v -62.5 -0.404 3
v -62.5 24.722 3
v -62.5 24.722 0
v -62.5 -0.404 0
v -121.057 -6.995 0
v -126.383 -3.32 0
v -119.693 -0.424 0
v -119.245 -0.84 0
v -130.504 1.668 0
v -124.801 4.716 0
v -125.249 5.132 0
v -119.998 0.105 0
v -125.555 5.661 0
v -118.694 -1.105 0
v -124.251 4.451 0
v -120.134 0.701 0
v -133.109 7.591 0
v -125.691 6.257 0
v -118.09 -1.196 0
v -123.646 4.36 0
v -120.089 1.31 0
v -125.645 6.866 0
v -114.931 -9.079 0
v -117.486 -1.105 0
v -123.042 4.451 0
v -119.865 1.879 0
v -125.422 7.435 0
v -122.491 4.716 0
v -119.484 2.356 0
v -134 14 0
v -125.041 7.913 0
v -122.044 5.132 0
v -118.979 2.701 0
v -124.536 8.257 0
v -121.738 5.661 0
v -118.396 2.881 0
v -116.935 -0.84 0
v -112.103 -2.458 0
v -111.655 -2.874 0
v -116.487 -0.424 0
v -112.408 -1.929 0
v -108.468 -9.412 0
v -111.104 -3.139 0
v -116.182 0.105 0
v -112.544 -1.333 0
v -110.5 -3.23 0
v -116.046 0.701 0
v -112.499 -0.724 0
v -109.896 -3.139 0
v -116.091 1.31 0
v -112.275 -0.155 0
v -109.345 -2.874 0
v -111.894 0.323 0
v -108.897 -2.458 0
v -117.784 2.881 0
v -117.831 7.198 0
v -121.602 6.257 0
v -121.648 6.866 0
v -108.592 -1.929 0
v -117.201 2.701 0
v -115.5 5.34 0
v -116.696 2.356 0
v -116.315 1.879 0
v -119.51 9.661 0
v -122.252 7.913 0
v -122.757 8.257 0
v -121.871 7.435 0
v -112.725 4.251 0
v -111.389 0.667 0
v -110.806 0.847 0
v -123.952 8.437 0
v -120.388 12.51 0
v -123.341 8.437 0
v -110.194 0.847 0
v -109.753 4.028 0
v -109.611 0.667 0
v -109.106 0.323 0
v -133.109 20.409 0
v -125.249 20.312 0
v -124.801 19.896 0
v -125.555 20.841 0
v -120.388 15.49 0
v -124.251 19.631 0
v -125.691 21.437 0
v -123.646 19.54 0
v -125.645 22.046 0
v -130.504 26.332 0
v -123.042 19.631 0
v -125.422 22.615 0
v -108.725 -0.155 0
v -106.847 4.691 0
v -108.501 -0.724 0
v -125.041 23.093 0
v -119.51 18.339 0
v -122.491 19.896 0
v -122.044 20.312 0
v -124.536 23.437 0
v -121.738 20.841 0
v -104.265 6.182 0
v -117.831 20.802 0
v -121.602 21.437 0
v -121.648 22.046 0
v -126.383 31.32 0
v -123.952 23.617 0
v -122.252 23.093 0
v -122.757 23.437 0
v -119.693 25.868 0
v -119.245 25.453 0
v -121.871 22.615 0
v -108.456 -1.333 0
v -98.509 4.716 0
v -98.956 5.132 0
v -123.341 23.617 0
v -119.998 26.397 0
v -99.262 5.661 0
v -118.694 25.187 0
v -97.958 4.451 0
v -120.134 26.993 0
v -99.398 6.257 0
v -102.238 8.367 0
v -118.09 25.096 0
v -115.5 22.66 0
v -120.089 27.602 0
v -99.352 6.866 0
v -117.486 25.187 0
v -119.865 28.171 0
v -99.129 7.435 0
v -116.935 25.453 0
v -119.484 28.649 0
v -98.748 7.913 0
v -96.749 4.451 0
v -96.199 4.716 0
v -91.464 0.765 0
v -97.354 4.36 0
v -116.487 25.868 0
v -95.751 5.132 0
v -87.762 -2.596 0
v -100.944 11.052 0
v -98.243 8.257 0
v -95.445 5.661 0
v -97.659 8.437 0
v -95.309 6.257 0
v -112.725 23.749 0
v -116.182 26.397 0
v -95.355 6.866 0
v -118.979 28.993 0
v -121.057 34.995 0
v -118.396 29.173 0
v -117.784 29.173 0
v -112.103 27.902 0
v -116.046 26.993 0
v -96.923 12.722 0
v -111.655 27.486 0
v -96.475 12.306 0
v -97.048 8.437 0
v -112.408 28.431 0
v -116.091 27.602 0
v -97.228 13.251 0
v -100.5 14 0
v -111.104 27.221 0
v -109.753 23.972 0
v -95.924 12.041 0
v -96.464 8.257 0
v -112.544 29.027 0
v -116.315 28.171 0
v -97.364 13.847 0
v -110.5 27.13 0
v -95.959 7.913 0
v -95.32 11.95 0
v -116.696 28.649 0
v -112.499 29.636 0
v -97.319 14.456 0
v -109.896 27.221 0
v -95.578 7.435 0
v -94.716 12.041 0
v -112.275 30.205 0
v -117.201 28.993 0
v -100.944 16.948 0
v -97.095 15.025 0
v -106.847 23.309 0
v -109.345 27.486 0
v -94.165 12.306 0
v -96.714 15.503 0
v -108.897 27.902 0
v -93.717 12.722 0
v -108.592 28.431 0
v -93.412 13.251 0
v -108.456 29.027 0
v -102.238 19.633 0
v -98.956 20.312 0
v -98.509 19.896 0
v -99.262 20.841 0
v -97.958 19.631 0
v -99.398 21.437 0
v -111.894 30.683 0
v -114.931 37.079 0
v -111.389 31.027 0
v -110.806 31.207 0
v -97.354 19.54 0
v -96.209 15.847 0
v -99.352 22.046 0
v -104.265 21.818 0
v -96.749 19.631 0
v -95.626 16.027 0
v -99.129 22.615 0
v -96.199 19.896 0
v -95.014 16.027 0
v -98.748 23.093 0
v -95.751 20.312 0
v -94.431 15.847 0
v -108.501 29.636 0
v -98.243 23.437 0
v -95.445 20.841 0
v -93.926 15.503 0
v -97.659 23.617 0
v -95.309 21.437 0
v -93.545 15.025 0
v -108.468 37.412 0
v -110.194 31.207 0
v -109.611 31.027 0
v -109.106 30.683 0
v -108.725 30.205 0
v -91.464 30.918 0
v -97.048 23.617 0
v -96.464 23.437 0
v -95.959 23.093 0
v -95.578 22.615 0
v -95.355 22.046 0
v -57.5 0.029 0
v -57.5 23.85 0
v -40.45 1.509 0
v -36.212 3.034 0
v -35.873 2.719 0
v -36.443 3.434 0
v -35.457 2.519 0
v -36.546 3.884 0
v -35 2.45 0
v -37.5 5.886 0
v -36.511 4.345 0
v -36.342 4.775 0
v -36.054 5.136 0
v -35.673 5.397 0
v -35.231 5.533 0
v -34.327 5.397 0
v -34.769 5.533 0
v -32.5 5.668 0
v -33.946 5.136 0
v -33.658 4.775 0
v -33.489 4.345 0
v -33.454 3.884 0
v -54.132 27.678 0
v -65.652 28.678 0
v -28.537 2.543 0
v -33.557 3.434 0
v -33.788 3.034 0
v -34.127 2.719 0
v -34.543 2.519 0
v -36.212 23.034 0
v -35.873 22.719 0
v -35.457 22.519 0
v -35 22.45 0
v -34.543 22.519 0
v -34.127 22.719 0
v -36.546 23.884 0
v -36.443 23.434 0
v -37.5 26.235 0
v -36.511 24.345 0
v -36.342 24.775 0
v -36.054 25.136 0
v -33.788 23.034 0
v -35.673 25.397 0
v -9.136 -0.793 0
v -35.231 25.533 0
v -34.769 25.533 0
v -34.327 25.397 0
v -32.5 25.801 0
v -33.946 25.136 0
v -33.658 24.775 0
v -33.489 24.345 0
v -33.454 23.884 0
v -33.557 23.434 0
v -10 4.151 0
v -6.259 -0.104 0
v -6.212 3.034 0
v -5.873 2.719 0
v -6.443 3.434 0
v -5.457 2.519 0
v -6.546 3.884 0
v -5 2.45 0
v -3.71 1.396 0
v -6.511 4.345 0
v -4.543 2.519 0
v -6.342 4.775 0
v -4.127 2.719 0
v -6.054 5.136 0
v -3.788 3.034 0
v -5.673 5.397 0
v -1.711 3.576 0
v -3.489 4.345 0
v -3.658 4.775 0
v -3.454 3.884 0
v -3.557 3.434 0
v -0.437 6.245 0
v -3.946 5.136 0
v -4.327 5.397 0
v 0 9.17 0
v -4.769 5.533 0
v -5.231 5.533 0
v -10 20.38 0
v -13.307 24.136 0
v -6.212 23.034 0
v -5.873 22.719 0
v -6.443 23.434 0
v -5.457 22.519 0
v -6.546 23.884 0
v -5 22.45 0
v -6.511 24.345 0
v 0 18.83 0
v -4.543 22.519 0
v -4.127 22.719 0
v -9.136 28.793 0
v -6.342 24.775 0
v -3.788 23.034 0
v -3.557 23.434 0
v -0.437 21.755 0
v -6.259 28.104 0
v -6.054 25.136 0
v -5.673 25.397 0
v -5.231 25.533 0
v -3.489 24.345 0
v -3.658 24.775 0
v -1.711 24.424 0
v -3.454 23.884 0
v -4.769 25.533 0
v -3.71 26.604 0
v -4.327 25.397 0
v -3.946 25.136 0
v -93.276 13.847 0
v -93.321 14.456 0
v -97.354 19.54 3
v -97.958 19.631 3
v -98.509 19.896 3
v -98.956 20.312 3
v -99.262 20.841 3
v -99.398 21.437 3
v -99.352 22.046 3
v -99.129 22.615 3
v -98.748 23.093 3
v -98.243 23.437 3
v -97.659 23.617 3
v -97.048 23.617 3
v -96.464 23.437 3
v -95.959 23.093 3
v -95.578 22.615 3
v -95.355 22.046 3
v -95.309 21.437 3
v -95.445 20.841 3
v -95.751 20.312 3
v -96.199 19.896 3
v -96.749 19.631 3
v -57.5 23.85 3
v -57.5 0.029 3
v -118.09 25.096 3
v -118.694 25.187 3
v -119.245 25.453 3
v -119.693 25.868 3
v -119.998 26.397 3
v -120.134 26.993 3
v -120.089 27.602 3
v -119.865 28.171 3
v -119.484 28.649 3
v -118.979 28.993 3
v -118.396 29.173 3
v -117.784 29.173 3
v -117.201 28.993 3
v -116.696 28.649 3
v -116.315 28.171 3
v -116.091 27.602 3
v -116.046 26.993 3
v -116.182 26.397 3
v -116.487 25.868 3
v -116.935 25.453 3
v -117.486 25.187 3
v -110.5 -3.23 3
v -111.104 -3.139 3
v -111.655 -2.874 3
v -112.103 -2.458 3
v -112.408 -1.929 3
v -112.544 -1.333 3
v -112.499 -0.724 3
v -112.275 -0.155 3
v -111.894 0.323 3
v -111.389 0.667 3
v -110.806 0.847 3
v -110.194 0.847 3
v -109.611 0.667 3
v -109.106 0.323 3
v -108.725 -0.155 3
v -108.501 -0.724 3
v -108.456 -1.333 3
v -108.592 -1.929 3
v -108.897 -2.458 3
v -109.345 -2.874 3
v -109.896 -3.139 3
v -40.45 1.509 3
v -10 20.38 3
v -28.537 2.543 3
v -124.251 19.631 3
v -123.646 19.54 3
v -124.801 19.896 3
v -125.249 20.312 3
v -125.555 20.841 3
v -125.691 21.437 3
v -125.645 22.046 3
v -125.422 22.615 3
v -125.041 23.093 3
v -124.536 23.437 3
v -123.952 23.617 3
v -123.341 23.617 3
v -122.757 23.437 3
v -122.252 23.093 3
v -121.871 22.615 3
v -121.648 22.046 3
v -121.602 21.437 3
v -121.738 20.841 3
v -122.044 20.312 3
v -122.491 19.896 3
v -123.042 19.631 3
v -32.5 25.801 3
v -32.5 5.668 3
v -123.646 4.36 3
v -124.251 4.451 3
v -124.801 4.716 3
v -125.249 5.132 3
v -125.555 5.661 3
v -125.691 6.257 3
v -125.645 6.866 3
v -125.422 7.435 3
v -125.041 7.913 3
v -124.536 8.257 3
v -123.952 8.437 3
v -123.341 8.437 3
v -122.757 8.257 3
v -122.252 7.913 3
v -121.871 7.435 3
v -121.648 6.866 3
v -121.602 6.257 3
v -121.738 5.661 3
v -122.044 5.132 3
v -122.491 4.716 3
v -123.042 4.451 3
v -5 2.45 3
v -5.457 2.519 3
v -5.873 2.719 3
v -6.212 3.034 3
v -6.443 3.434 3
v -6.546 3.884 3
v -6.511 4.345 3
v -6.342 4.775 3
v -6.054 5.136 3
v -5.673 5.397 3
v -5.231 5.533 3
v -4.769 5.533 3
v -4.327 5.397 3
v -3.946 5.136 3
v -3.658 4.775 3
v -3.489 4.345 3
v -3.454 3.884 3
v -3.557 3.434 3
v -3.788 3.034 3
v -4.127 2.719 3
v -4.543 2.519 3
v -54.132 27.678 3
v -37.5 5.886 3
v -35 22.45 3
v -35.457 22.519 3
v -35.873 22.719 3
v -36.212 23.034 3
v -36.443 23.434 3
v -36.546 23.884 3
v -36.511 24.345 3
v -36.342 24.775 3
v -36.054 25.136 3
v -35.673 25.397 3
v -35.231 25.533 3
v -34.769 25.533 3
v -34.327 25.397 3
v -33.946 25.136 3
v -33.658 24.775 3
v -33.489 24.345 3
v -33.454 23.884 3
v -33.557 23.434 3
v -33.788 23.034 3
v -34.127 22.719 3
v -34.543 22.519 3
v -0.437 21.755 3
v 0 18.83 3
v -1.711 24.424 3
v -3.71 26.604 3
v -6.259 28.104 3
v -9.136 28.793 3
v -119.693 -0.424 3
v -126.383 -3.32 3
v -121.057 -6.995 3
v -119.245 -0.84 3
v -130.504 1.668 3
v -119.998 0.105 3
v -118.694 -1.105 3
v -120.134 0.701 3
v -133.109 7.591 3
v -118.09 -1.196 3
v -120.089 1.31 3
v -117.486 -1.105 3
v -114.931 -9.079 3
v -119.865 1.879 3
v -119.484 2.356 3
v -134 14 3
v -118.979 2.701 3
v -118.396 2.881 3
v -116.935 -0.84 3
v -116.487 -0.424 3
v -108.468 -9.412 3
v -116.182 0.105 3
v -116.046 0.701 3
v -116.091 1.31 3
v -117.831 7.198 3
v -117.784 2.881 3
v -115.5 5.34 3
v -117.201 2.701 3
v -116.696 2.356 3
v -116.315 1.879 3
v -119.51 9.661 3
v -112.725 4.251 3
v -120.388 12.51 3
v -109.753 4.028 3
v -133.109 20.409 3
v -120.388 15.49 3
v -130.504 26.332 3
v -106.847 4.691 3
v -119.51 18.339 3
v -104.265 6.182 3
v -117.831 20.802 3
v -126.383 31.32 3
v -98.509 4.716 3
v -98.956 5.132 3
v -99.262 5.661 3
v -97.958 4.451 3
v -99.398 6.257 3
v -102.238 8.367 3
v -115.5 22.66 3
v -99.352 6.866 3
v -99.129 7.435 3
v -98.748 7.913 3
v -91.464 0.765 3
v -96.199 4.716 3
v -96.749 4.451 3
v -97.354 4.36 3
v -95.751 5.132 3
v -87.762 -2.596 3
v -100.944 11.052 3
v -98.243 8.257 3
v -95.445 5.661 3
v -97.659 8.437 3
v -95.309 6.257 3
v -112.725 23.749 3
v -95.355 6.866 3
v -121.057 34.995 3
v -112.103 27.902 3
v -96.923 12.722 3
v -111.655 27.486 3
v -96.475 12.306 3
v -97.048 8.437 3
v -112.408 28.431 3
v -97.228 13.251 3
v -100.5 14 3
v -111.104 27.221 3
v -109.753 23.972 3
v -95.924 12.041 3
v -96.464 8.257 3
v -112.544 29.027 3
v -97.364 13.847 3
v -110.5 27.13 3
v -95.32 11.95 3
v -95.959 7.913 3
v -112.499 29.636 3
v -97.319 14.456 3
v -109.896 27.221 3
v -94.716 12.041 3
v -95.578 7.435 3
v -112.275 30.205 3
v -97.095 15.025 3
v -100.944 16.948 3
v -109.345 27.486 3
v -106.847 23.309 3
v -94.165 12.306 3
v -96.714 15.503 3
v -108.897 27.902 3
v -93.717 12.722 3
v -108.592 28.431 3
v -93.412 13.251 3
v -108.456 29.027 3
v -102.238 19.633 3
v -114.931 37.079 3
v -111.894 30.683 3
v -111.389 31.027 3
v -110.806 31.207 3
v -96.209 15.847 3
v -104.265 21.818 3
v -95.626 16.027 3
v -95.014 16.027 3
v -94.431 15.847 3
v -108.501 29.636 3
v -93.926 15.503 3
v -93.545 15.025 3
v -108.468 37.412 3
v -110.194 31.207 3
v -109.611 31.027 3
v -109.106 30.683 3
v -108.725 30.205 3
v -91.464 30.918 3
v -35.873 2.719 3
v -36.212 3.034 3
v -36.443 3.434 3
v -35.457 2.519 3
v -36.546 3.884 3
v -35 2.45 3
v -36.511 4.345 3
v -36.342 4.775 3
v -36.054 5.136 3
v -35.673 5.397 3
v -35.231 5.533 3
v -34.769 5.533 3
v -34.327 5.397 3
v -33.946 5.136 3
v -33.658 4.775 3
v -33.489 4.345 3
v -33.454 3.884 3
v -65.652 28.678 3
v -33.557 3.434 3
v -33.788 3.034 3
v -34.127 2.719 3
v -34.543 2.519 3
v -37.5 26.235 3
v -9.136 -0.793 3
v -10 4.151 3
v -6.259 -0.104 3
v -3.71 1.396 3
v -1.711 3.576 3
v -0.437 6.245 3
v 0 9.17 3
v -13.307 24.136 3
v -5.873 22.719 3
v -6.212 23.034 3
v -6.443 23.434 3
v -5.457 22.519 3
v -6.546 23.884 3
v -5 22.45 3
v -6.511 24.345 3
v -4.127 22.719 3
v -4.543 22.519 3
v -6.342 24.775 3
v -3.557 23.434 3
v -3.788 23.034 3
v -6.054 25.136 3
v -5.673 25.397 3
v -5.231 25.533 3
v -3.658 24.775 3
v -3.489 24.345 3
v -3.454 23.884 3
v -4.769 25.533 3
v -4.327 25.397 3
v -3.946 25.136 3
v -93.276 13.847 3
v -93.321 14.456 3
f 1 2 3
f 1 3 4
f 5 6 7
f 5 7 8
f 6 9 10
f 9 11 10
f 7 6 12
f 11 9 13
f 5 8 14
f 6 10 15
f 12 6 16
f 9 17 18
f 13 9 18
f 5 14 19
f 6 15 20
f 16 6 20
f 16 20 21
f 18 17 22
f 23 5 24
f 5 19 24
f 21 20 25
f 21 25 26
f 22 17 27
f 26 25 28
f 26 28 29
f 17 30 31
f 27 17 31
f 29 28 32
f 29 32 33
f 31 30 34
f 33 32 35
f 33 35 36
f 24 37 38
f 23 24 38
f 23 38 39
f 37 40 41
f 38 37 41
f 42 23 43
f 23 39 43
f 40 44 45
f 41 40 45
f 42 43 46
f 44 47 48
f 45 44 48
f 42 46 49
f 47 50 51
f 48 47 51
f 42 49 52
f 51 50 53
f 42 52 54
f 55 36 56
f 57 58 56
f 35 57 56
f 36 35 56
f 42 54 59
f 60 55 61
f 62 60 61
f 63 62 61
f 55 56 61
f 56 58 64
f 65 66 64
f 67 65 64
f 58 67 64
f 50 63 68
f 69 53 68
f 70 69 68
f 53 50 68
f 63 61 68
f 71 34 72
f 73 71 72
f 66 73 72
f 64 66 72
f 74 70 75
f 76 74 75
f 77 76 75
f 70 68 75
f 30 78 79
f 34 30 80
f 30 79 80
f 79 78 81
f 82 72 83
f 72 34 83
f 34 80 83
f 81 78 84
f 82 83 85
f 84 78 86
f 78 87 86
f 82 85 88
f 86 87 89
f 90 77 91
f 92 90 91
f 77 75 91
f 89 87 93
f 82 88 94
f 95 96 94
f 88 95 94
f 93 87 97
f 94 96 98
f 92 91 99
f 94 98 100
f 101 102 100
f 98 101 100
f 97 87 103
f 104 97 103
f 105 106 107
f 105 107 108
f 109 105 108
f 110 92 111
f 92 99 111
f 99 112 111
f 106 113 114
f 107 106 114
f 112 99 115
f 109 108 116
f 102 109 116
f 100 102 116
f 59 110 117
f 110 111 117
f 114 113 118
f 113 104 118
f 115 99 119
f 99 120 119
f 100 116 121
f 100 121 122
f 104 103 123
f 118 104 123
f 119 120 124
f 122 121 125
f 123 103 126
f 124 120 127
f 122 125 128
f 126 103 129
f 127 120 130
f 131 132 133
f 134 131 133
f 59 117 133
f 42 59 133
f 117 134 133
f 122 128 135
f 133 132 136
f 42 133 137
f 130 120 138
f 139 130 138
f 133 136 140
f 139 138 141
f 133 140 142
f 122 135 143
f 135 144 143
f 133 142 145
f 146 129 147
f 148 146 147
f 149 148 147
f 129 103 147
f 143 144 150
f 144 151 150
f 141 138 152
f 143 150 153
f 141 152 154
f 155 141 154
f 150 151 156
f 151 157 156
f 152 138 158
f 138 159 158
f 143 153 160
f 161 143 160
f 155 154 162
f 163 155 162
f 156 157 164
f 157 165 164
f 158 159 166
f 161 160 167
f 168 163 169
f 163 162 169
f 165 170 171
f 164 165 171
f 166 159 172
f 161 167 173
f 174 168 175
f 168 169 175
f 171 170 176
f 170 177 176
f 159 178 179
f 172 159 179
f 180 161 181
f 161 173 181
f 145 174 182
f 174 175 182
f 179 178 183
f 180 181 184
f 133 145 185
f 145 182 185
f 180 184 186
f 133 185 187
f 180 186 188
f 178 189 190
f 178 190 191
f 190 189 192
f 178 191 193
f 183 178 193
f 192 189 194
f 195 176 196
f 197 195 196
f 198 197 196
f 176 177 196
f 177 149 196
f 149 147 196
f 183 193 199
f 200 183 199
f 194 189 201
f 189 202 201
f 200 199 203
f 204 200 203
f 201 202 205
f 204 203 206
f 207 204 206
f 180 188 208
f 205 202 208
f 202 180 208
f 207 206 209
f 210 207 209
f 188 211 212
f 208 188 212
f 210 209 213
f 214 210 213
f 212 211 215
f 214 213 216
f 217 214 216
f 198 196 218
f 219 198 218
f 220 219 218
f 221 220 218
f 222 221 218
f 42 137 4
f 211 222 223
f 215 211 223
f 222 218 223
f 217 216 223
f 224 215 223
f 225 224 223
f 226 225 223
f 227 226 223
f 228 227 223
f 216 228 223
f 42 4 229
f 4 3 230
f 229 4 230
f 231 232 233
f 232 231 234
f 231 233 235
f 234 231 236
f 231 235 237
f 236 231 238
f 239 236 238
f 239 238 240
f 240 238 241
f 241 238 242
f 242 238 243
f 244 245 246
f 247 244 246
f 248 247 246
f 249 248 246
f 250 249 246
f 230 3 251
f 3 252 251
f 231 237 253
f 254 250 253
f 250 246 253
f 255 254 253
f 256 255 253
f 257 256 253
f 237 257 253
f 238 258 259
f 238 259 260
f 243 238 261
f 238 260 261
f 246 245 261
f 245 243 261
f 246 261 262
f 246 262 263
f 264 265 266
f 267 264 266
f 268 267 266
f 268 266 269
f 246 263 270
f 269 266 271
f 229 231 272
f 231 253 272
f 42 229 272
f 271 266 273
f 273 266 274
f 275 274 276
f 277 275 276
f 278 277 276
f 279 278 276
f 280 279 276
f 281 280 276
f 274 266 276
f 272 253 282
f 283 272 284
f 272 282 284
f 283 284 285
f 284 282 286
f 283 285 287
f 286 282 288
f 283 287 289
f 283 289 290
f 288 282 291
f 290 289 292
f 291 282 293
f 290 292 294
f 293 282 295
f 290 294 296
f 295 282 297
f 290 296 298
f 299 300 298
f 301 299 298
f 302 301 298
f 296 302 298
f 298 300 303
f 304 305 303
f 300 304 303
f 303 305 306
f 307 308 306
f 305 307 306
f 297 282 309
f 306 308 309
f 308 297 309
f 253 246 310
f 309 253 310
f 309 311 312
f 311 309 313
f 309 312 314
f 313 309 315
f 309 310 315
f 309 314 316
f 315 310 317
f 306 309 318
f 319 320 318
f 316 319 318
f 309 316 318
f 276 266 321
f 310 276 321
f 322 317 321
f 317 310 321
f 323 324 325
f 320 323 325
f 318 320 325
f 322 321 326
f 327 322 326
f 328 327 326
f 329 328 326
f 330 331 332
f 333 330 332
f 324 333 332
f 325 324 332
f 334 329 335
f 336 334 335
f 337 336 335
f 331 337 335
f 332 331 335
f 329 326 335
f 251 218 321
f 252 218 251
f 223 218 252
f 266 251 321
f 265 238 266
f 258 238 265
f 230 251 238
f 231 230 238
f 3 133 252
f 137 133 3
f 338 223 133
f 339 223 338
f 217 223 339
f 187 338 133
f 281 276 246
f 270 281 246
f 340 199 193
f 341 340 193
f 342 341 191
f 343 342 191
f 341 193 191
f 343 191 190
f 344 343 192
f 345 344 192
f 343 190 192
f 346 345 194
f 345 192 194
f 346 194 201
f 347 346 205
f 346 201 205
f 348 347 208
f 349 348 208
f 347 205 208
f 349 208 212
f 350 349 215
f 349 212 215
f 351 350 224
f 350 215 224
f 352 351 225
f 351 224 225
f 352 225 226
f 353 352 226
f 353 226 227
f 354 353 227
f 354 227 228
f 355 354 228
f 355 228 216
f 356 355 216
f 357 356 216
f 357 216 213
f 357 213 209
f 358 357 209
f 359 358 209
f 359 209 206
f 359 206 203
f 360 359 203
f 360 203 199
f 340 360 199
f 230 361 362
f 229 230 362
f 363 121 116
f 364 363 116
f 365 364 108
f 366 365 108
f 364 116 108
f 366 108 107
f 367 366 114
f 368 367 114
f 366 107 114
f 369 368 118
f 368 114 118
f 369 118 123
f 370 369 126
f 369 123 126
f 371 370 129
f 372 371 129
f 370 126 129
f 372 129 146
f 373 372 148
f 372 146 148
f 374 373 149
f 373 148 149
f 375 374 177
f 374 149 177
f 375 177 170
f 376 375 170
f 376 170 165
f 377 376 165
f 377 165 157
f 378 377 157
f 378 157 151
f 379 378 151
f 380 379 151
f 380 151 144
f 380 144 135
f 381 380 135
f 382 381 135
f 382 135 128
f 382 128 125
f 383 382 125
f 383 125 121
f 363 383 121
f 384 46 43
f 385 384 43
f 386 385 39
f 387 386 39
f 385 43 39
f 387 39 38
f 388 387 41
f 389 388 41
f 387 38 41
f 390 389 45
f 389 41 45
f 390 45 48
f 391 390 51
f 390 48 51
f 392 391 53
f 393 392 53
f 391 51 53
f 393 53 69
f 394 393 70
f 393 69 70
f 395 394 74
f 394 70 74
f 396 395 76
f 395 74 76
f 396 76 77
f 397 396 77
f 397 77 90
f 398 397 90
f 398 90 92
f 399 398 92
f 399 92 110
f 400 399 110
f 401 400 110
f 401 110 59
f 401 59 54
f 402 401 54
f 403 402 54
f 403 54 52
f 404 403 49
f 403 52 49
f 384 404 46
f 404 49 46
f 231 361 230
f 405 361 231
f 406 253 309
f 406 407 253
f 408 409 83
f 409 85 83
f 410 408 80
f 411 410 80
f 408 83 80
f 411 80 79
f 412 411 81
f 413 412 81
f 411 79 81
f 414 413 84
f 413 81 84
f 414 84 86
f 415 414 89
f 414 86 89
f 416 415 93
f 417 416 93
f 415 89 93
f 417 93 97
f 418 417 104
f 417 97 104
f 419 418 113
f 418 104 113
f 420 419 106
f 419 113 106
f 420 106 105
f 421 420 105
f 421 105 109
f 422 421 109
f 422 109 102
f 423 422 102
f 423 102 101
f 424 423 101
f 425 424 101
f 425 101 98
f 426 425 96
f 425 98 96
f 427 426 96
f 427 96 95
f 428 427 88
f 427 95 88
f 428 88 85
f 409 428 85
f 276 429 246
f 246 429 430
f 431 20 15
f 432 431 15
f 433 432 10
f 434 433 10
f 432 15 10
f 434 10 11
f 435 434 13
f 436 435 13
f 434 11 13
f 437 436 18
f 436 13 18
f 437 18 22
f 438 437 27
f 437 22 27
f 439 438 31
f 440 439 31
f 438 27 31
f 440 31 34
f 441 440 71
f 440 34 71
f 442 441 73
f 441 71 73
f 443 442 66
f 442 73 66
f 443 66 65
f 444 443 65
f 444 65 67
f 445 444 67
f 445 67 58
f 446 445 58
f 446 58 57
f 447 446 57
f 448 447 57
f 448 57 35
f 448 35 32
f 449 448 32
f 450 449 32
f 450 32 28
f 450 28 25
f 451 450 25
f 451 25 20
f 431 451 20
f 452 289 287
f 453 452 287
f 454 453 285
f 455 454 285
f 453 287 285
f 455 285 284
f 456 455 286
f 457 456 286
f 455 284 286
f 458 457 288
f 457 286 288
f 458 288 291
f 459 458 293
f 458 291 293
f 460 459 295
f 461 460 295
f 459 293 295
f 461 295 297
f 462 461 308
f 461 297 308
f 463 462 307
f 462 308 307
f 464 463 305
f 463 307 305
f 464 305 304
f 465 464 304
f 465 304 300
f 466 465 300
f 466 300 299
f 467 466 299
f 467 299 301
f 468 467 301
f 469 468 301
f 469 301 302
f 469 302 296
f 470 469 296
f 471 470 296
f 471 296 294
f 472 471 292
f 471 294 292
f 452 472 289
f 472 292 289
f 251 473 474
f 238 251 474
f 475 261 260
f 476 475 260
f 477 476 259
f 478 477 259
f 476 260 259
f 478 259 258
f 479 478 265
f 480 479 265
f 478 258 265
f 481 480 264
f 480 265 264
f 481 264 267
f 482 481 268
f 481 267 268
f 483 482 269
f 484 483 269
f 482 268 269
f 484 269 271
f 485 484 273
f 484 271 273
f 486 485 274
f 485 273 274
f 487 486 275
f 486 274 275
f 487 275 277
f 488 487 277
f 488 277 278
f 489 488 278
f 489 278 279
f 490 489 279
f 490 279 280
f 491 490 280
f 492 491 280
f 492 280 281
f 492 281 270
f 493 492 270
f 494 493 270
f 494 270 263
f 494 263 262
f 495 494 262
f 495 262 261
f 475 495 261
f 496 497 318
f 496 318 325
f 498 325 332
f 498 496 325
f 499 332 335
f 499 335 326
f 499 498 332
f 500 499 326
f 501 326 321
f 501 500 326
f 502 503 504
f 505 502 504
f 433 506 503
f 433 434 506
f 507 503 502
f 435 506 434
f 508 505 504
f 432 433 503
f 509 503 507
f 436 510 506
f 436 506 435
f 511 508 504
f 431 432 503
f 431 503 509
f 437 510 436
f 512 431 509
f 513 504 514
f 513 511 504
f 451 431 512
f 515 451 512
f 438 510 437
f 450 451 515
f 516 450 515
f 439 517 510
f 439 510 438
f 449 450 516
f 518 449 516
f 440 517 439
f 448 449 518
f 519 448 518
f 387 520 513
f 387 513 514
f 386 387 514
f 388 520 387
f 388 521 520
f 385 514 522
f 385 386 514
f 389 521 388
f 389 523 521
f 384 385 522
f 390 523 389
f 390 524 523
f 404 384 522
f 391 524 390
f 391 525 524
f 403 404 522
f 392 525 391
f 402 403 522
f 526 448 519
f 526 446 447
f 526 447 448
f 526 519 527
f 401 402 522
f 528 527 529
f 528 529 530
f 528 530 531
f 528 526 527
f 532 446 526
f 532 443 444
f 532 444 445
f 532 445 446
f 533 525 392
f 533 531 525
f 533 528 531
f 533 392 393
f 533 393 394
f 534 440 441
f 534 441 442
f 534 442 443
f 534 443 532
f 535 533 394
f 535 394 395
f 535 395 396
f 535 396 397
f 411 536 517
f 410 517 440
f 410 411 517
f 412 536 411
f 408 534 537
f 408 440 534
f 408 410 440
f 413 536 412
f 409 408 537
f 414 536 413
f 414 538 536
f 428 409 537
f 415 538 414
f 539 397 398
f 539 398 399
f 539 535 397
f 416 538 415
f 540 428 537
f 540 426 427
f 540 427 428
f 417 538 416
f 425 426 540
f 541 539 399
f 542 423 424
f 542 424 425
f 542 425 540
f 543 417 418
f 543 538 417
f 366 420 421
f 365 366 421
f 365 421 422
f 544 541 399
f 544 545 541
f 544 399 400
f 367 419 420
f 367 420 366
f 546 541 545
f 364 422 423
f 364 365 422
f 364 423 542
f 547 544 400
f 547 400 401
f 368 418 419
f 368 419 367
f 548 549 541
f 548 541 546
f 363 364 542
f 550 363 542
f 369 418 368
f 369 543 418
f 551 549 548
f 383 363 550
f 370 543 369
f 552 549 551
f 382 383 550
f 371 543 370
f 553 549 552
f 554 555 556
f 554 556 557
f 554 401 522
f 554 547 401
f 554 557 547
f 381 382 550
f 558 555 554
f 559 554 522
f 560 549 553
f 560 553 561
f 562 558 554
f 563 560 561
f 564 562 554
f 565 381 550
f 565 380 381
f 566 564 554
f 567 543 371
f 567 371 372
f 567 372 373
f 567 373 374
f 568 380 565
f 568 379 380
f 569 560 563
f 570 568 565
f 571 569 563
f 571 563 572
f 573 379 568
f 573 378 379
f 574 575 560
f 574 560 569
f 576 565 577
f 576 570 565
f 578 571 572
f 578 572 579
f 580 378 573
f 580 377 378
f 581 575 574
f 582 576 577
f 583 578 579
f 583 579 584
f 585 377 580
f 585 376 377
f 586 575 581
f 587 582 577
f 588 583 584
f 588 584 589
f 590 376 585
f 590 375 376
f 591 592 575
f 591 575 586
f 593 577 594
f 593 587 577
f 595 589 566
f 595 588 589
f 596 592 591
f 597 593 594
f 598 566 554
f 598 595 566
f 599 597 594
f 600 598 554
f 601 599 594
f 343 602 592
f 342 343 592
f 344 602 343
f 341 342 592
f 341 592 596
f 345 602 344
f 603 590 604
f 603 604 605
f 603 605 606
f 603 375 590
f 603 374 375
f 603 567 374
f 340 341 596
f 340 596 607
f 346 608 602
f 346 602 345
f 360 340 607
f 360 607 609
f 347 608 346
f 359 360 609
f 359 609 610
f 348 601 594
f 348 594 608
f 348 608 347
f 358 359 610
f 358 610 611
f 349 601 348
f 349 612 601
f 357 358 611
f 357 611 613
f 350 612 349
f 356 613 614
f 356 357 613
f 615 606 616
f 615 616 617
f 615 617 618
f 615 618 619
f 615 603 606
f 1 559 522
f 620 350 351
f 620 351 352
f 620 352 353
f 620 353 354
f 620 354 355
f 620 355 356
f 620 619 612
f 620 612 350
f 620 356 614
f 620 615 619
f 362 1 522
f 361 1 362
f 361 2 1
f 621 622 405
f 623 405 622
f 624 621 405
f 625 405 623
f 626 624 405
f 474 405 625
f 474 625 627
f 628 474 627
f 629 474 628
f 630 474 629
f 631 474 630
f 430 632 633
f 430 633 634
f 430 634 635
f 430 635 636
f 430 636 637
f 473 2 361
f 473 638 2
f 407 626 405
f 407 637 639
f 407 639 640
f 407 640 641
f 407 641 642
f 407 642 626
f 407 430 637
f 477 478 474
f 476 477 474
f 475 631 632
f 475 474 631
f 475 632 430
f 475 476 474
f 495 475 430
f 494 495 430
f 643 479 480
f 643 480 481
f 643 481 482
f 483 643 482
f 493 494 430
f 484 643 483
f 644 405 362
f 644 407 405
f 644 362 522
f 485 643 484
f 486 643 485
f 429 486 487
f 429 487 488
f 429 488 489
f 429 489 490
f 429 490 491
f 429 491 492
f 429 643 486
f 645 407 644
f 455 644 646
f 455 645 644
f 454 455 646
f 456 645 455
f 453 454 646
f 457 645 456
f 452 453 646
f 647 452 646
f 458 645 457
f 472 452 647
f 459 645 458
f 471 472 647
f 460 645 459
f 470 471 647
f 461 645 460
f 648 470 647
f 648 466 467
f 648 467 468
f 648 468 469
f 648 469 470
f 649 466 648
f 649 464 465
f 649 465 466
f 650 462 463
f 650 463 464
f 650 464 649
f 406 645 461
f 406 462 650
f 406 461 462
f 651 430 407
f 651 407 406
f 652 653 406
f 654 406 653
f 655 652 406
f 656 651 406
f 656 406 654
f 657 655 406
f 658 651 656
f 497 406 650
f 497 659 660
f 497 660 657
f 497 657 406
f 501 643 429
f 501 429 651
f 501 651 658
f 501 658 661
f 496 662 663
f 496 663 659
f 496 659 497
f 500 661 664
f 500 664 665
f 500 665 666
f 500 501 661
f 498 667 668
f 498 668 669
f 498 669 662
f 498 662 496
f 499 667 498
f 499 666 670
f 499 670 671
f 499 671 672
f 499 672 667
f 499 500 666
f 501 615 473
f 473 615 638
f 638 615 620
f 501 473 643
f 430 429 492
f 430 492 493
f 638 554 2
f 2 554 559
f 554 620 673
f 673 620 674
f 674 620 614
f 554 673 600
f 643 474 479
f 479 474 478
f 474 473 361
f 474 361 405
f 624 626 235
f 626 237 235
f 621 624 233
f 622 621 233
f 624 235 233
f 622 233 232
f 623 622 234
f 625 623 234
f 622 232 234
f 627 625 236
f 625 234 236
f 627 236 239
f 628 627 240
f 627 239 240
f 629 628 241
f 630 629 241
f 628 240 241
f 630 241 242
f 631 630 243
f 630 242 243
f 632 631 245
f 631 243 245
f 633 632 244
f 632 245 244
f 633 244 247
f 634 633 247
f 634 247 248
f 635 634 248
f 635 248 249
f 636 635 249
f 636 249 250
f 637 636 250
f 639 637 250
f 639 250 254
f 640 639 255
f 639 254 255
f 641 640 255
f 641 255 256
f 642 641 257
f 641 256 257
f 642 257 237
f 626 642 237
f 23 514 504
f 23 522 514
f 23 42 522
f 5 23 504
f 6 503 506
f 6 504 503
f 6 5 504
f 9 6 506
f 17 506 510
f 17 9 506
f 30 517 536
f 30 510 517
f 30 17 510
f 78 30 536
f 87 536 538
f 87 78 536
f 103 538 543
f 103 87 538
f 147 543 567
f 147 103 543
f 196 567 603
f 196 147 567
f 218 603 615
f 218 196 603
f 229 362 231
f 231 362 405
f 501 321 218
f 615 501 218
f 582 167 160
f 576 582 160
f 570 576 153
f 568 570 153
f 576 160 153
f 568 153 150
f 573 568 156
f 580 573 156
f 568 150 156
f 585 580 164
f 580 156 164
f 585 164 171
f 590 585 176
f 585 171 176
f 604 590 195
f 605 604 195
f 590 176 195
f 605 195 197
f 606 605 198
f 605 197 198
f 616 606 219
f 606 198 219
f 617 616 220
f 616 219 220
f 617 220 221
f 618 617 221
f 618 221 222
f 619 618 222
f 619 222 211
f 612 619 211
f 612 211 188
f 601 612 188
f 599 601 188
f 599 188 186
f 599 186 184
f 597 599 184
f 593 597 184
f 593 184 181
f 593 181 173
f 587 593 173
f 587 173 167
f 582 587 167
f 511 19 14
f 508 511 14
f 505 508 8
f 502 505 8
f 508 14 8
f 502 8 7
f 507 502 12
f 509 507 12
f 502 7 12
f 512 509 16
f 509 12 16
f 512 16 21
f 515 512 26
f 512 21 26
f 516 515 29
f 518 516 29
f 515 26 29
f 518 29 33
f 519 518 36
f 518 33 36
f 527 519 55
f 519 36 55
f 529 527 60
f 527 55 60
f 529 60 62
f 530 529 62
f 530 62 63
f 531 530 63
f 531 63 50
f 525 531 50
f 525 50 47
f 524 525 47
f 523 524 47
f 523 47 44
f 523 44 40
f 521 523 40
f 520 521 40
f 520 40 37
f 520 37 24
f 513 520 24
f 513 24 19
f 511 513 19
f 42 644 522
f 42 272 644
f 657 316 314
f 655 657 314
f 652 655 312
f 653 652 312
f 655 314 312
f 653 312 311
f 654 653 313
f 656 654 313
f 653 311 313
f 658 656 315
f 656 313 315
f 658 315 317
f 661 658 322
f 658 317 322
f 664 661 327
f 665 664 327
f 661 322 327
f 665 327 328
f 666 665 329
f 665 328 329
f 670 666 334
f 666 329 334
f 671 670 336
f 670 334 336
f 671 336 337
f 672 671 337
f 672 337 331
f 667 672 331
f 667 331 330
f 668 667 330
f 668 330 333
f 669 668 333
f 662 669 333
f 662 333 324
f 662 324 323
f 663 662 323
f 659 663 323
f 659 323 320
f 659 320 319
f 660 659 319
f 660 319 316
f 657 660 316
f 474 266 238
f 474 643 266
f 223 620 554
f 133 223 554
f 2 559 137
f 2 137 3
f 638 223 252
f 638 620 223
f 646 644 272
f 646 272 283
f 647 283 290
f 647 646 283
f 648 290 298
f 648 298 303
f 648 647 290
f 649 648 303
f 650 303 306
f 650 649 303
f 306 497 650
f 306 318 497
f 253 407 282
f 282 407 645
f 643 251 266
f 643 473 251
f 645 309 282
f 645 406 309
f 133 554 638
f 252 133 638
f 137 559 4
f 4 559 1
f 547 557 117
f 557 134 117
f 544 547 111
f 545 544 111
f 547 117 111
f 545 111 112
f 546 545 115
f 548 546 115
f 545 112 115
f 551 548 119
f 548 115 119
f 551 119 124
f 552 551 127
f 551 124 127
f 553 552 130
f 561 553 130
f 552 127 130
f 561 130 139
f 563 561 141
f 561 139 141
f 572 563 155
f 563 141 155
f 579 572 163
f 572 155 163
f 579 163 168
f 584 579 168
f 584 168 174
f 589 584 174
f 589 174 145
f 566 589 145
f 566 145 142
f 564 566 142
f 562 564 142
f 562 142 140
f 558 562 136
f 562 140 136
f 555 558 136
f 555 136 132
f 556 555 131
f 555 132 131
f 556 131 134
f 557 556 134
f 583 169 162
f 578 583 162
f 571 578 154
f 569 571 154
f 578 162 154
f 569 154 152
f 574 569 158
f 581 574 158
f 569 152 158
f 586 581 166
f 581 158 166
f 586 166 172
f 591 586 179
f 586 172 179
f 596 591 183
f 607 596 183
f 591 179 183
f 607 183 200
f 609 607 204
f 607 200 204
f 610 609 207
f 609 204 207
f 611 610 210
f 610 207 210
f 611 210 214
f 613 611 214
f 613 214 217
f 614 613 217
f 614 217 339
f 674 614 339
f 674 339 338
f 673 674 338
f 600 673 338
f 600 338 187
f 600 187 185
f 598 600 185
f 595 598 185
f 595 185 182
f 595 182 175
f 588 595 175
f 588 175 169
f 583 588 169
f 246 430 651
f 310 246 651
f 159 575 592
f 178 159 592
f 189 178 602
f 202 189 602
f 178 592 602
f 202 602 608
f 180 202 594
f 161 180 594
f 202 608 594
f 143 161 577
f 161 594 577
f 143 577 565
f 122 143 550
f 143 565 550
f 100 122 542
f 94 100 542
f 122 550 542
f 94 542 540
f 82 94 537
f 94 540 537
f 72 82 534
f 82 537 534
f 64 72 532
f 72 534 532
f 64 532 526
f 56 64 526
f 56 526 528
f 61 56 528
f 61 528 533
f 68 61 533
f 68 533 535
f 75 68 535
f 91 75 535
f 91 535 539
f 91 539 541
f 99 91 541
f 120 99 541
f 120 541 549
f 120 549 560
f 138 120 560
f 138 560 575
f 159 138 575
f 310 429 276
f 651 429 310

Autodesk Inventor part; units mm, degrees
ref_plane "YZ Plane" through (0, 0, 0) normal (1, 0, 0) x (0, 1, 0)
ref_plane "XZ Plane" through (0, 0, 0) normal (0, 1, 0) x (-1, 0, 0)
ref_plane "XY Plane" through (0, 0, 0) normal (0, 0, 1) x (1, 0, 0)
sketch "スケッチ1" plane through (0, 0, 0) normal (0, 0, 1) x (1, 0, 0)
  line L0 (0, 0) -> (-57.5, 0)
  line L1 (-57.5, 0) -> (-57.5, 28)
  line L2 (-57.5, 28) -> (0, 28)
  line L3 (0, 28) -> (0, 0)
  line L4 (0, 14) -> (-110.5, 14)
  circle A0 centre (-110.5, 14) radius 53
  circle A1 centre (-110.5, 14) radius 23.5
  line L5 (0, 28) -> (-108.4685, 37.412)
  line L6 (0, 0) -> (-108.4685, -9.412)
  point P0 (-108.4685, -9.412)
  dimension "d3" = 47
  dimension "d0" = 28
  dimension "d1" = 57.5
  dimension "d2" = 106
extrude "押し出し1" add sketch "スケッチ1" along normal blind 3 contours L6 A0 L1 L0 | L0 L1 L4 L3 | L4 L1 L2 L3 | L6 A1 L4 A0 | A0 L5 L2 L1 | L4 A1 L5 A0 | A1
sketch "スケッチ2" plane through (0, 0, 3) normal (0, 0, 1) x (1, 0, 0)
  line L0 (0, 28) -> (-108.4685, 37.412) projected
  line L1 (0, 28) -> (-47.5, 28)
  line L2 (-47.5, 28) -> (-47.5, 0)
  line L3 (-47.5, 0) -> (0, 0)
  line L4 (0, 0) -> (0, 28)
  line L5 (-5, 28) -> (-5, 0)
  line L6 (-35, 28) -> (-35, 0)
  line L7 (0, 14) -> (-47.5, 14)
  point P0 (-35, 24)
  point P1 (-5, 24)
  point P2 (-35, 4)
  point P3 (-5, 4)
  dimension "d6" = 28
  dimension "d7" = 47.5
  dimension "d8" = 5
  dimension "d9" = 30
  dimension "d10" = 10
  dimension "d11" = 10
hole "穴1" at (-35, 24, 3) at (-5, 24, 3) at (-35, 4, 3) at (-5, 4, 3) direction (0, 0, -1) diameter 3.1 end through all
sketch "スケッチ3" plane through (0, 0, 3) normal (0, 0, 1) x (1, 0, 0)
  arc A0 (-108.4685, 37.412) -> (-108.4685, -9.412) centre (-110.5, 14) ccw projected
  circle A1 centre (-110.5, 14) radius 15.18
  circle A2 centre (-110.5, 14) radius 6
  line L0 (-110.5, 14) -> (-118.09, 27.1463)
  line L1 (-123.6463, 21.59) -> (-110.5, 14)
  line L2 (-110.5, 14) -> (-102.91, 27.1463)
  line L3 (-110.5, 14) -> (-110.5, 29.18)
  point P0 (0, 0)
  point P1 (-123.6463, 6.41)
  point P2 (-110.5, -1.18)
  point P3 (-97.3537, 6.41)
  point P4 (-97.3537, 21.59)
  point P5 (-110.5, 29.18)
  point P6 (-118.09, 0.8537)
  point P7 (-95.32, 14)
  dimension "d19" = 30.36
  dimension "d22" = 360
  dimension "d24" = 12
  dimension "d28" = 360
  dimension "d59" = 30
  dimension "d61" = 30
hole "穴2" at (-123.6463, 21.59, 3) at (-123.6463, 6.41, 3) at (-110.5, -1.18, 3) at (-97.3537, 6.41, 3) at (-97.3537, 21.59, 3) at (-110.5, 29.18, 3) at (-118.09, 27.1463, 3) at (-118.09, 0.8537, 3) at (-95.32, 14, 3) direction (0, 0, -1) diameter 4.1 end through all
sketch "スケッチ4" plane through (0, 0, 3) normal (0, 0, 1) x (1, 0, 0)
  arc A0 (-108.4685, 37.412) -> (-108.4685, -9.412) centre (-110.5, 14) ccw projected
  circle A1 centre (-110.5, 14) radius 10
  circle A2 centre (-110.5, 14) radius 23.5
  line L0 (-94.4636, -3.178) -> (0, 5.0188)
  line L1 (0, 0) -> (0, 28) projected
  line L2 (-108.4685, -9.412) -> (0, 0) projected
  line L3 (-94.4636, 31.178) -> (0, 22.9812)
  line L4 (0, 28) -> (-108.4685, 37.412) projected
  line L5 (-10, 23.8489) -> (-10, 4.1511)
  line L6 (-37.5, 26.2352) -> (-37.5, 1.7648)
  circle A3 centre (-35, 4) radius 1.55 projected
  line L7 (-32.5, 25.8013) -> (-32.5, 2.1987)
  circle A4 centre (-35, 24) radius 1.55 projected
  line L8 (-10, 23.8489) -> (-32.5, 2.1987)
  line L9 (-32.5, 5.6681) -> (-13.3073, 24.1359)
  line L10 (-28.537, 2.5426) -> (-10, 20.3795)
  line L11 (-62.5, 28.4045) -> (-62.5, -0.4045)
  line L12 (-57.5, 27.9706) -> (-57.5, 0.0294)
  line L13 (-57.5, 27.9706) -> (-37.5, 1.7648)
  line L14 (-57.5, 23.8499) -> (-40.4496, 1.5089)
  line L15 (-54.1321, 27.6784) -> (-37.5, 5.8856)
  line L16 (-94.4636, 31.178) -> (-94.4636, -3.178)
  line L17 (-91.4636, 30.9177) -> (-91.4636, -2.9177)
  line L18 (-62.5, 28.4045) -> (-91.4636, -2.9177)
  line L19 (-91.4636, 0.7646) -> (-65.6521, 28.678)
  line L20 (-87.7615, -2.5965) -> (-62.5, 24.7222)
  dimension "d37" = 20
  dimension "d38" = 5
  dimension "d39" = 5
  dimension "d40" = 10
  dimension "d41" = 2.5
  dimension "d42" = 2.5
  dimension "d43" = 2.5
  dimension "d44" = 2.5
  dimension "d45" = 5
  dimension "d46" = 20
  dimension "d47" = 2.5
  dimension "d48" = 2.5
  dimension "d49" = 3
  dimension "d50" = 2.5
  dimension "d51" = 2.5
extrude "押し出し2" cut sketch "スケッチ4" against normal blind 3 contours L17 L3 L19 A2 | A2 L19 L17 | L20 L11 L0 | L0 L10 L5 | L9 L7 L3 | L12 L14 L0 | L3 L6 L15 picked at (-90.6492, 17.3589)
fillet "フィレット1" radius 10 2 edges at (0, 28, 1.5) (0, 0, 1.5)
sketch "スケッチ5" plane through (0, 0, 3) normal (0, 0, 1) x (1, 0, 0)
  arc A0 (-108.4685, 37.412) -> (-108.4685, -9.412) centre (-110.5, 14) ccw projected
  circle A1 centre (-110.5, 14) radius 10
  point P0 (0, 0)
  dimension "d55" = 20
extrude "押し出し3" cut sketch "スケッチ5" against normal blind 3
properties part number "link1plate4" material "アルミニウム 6061"
